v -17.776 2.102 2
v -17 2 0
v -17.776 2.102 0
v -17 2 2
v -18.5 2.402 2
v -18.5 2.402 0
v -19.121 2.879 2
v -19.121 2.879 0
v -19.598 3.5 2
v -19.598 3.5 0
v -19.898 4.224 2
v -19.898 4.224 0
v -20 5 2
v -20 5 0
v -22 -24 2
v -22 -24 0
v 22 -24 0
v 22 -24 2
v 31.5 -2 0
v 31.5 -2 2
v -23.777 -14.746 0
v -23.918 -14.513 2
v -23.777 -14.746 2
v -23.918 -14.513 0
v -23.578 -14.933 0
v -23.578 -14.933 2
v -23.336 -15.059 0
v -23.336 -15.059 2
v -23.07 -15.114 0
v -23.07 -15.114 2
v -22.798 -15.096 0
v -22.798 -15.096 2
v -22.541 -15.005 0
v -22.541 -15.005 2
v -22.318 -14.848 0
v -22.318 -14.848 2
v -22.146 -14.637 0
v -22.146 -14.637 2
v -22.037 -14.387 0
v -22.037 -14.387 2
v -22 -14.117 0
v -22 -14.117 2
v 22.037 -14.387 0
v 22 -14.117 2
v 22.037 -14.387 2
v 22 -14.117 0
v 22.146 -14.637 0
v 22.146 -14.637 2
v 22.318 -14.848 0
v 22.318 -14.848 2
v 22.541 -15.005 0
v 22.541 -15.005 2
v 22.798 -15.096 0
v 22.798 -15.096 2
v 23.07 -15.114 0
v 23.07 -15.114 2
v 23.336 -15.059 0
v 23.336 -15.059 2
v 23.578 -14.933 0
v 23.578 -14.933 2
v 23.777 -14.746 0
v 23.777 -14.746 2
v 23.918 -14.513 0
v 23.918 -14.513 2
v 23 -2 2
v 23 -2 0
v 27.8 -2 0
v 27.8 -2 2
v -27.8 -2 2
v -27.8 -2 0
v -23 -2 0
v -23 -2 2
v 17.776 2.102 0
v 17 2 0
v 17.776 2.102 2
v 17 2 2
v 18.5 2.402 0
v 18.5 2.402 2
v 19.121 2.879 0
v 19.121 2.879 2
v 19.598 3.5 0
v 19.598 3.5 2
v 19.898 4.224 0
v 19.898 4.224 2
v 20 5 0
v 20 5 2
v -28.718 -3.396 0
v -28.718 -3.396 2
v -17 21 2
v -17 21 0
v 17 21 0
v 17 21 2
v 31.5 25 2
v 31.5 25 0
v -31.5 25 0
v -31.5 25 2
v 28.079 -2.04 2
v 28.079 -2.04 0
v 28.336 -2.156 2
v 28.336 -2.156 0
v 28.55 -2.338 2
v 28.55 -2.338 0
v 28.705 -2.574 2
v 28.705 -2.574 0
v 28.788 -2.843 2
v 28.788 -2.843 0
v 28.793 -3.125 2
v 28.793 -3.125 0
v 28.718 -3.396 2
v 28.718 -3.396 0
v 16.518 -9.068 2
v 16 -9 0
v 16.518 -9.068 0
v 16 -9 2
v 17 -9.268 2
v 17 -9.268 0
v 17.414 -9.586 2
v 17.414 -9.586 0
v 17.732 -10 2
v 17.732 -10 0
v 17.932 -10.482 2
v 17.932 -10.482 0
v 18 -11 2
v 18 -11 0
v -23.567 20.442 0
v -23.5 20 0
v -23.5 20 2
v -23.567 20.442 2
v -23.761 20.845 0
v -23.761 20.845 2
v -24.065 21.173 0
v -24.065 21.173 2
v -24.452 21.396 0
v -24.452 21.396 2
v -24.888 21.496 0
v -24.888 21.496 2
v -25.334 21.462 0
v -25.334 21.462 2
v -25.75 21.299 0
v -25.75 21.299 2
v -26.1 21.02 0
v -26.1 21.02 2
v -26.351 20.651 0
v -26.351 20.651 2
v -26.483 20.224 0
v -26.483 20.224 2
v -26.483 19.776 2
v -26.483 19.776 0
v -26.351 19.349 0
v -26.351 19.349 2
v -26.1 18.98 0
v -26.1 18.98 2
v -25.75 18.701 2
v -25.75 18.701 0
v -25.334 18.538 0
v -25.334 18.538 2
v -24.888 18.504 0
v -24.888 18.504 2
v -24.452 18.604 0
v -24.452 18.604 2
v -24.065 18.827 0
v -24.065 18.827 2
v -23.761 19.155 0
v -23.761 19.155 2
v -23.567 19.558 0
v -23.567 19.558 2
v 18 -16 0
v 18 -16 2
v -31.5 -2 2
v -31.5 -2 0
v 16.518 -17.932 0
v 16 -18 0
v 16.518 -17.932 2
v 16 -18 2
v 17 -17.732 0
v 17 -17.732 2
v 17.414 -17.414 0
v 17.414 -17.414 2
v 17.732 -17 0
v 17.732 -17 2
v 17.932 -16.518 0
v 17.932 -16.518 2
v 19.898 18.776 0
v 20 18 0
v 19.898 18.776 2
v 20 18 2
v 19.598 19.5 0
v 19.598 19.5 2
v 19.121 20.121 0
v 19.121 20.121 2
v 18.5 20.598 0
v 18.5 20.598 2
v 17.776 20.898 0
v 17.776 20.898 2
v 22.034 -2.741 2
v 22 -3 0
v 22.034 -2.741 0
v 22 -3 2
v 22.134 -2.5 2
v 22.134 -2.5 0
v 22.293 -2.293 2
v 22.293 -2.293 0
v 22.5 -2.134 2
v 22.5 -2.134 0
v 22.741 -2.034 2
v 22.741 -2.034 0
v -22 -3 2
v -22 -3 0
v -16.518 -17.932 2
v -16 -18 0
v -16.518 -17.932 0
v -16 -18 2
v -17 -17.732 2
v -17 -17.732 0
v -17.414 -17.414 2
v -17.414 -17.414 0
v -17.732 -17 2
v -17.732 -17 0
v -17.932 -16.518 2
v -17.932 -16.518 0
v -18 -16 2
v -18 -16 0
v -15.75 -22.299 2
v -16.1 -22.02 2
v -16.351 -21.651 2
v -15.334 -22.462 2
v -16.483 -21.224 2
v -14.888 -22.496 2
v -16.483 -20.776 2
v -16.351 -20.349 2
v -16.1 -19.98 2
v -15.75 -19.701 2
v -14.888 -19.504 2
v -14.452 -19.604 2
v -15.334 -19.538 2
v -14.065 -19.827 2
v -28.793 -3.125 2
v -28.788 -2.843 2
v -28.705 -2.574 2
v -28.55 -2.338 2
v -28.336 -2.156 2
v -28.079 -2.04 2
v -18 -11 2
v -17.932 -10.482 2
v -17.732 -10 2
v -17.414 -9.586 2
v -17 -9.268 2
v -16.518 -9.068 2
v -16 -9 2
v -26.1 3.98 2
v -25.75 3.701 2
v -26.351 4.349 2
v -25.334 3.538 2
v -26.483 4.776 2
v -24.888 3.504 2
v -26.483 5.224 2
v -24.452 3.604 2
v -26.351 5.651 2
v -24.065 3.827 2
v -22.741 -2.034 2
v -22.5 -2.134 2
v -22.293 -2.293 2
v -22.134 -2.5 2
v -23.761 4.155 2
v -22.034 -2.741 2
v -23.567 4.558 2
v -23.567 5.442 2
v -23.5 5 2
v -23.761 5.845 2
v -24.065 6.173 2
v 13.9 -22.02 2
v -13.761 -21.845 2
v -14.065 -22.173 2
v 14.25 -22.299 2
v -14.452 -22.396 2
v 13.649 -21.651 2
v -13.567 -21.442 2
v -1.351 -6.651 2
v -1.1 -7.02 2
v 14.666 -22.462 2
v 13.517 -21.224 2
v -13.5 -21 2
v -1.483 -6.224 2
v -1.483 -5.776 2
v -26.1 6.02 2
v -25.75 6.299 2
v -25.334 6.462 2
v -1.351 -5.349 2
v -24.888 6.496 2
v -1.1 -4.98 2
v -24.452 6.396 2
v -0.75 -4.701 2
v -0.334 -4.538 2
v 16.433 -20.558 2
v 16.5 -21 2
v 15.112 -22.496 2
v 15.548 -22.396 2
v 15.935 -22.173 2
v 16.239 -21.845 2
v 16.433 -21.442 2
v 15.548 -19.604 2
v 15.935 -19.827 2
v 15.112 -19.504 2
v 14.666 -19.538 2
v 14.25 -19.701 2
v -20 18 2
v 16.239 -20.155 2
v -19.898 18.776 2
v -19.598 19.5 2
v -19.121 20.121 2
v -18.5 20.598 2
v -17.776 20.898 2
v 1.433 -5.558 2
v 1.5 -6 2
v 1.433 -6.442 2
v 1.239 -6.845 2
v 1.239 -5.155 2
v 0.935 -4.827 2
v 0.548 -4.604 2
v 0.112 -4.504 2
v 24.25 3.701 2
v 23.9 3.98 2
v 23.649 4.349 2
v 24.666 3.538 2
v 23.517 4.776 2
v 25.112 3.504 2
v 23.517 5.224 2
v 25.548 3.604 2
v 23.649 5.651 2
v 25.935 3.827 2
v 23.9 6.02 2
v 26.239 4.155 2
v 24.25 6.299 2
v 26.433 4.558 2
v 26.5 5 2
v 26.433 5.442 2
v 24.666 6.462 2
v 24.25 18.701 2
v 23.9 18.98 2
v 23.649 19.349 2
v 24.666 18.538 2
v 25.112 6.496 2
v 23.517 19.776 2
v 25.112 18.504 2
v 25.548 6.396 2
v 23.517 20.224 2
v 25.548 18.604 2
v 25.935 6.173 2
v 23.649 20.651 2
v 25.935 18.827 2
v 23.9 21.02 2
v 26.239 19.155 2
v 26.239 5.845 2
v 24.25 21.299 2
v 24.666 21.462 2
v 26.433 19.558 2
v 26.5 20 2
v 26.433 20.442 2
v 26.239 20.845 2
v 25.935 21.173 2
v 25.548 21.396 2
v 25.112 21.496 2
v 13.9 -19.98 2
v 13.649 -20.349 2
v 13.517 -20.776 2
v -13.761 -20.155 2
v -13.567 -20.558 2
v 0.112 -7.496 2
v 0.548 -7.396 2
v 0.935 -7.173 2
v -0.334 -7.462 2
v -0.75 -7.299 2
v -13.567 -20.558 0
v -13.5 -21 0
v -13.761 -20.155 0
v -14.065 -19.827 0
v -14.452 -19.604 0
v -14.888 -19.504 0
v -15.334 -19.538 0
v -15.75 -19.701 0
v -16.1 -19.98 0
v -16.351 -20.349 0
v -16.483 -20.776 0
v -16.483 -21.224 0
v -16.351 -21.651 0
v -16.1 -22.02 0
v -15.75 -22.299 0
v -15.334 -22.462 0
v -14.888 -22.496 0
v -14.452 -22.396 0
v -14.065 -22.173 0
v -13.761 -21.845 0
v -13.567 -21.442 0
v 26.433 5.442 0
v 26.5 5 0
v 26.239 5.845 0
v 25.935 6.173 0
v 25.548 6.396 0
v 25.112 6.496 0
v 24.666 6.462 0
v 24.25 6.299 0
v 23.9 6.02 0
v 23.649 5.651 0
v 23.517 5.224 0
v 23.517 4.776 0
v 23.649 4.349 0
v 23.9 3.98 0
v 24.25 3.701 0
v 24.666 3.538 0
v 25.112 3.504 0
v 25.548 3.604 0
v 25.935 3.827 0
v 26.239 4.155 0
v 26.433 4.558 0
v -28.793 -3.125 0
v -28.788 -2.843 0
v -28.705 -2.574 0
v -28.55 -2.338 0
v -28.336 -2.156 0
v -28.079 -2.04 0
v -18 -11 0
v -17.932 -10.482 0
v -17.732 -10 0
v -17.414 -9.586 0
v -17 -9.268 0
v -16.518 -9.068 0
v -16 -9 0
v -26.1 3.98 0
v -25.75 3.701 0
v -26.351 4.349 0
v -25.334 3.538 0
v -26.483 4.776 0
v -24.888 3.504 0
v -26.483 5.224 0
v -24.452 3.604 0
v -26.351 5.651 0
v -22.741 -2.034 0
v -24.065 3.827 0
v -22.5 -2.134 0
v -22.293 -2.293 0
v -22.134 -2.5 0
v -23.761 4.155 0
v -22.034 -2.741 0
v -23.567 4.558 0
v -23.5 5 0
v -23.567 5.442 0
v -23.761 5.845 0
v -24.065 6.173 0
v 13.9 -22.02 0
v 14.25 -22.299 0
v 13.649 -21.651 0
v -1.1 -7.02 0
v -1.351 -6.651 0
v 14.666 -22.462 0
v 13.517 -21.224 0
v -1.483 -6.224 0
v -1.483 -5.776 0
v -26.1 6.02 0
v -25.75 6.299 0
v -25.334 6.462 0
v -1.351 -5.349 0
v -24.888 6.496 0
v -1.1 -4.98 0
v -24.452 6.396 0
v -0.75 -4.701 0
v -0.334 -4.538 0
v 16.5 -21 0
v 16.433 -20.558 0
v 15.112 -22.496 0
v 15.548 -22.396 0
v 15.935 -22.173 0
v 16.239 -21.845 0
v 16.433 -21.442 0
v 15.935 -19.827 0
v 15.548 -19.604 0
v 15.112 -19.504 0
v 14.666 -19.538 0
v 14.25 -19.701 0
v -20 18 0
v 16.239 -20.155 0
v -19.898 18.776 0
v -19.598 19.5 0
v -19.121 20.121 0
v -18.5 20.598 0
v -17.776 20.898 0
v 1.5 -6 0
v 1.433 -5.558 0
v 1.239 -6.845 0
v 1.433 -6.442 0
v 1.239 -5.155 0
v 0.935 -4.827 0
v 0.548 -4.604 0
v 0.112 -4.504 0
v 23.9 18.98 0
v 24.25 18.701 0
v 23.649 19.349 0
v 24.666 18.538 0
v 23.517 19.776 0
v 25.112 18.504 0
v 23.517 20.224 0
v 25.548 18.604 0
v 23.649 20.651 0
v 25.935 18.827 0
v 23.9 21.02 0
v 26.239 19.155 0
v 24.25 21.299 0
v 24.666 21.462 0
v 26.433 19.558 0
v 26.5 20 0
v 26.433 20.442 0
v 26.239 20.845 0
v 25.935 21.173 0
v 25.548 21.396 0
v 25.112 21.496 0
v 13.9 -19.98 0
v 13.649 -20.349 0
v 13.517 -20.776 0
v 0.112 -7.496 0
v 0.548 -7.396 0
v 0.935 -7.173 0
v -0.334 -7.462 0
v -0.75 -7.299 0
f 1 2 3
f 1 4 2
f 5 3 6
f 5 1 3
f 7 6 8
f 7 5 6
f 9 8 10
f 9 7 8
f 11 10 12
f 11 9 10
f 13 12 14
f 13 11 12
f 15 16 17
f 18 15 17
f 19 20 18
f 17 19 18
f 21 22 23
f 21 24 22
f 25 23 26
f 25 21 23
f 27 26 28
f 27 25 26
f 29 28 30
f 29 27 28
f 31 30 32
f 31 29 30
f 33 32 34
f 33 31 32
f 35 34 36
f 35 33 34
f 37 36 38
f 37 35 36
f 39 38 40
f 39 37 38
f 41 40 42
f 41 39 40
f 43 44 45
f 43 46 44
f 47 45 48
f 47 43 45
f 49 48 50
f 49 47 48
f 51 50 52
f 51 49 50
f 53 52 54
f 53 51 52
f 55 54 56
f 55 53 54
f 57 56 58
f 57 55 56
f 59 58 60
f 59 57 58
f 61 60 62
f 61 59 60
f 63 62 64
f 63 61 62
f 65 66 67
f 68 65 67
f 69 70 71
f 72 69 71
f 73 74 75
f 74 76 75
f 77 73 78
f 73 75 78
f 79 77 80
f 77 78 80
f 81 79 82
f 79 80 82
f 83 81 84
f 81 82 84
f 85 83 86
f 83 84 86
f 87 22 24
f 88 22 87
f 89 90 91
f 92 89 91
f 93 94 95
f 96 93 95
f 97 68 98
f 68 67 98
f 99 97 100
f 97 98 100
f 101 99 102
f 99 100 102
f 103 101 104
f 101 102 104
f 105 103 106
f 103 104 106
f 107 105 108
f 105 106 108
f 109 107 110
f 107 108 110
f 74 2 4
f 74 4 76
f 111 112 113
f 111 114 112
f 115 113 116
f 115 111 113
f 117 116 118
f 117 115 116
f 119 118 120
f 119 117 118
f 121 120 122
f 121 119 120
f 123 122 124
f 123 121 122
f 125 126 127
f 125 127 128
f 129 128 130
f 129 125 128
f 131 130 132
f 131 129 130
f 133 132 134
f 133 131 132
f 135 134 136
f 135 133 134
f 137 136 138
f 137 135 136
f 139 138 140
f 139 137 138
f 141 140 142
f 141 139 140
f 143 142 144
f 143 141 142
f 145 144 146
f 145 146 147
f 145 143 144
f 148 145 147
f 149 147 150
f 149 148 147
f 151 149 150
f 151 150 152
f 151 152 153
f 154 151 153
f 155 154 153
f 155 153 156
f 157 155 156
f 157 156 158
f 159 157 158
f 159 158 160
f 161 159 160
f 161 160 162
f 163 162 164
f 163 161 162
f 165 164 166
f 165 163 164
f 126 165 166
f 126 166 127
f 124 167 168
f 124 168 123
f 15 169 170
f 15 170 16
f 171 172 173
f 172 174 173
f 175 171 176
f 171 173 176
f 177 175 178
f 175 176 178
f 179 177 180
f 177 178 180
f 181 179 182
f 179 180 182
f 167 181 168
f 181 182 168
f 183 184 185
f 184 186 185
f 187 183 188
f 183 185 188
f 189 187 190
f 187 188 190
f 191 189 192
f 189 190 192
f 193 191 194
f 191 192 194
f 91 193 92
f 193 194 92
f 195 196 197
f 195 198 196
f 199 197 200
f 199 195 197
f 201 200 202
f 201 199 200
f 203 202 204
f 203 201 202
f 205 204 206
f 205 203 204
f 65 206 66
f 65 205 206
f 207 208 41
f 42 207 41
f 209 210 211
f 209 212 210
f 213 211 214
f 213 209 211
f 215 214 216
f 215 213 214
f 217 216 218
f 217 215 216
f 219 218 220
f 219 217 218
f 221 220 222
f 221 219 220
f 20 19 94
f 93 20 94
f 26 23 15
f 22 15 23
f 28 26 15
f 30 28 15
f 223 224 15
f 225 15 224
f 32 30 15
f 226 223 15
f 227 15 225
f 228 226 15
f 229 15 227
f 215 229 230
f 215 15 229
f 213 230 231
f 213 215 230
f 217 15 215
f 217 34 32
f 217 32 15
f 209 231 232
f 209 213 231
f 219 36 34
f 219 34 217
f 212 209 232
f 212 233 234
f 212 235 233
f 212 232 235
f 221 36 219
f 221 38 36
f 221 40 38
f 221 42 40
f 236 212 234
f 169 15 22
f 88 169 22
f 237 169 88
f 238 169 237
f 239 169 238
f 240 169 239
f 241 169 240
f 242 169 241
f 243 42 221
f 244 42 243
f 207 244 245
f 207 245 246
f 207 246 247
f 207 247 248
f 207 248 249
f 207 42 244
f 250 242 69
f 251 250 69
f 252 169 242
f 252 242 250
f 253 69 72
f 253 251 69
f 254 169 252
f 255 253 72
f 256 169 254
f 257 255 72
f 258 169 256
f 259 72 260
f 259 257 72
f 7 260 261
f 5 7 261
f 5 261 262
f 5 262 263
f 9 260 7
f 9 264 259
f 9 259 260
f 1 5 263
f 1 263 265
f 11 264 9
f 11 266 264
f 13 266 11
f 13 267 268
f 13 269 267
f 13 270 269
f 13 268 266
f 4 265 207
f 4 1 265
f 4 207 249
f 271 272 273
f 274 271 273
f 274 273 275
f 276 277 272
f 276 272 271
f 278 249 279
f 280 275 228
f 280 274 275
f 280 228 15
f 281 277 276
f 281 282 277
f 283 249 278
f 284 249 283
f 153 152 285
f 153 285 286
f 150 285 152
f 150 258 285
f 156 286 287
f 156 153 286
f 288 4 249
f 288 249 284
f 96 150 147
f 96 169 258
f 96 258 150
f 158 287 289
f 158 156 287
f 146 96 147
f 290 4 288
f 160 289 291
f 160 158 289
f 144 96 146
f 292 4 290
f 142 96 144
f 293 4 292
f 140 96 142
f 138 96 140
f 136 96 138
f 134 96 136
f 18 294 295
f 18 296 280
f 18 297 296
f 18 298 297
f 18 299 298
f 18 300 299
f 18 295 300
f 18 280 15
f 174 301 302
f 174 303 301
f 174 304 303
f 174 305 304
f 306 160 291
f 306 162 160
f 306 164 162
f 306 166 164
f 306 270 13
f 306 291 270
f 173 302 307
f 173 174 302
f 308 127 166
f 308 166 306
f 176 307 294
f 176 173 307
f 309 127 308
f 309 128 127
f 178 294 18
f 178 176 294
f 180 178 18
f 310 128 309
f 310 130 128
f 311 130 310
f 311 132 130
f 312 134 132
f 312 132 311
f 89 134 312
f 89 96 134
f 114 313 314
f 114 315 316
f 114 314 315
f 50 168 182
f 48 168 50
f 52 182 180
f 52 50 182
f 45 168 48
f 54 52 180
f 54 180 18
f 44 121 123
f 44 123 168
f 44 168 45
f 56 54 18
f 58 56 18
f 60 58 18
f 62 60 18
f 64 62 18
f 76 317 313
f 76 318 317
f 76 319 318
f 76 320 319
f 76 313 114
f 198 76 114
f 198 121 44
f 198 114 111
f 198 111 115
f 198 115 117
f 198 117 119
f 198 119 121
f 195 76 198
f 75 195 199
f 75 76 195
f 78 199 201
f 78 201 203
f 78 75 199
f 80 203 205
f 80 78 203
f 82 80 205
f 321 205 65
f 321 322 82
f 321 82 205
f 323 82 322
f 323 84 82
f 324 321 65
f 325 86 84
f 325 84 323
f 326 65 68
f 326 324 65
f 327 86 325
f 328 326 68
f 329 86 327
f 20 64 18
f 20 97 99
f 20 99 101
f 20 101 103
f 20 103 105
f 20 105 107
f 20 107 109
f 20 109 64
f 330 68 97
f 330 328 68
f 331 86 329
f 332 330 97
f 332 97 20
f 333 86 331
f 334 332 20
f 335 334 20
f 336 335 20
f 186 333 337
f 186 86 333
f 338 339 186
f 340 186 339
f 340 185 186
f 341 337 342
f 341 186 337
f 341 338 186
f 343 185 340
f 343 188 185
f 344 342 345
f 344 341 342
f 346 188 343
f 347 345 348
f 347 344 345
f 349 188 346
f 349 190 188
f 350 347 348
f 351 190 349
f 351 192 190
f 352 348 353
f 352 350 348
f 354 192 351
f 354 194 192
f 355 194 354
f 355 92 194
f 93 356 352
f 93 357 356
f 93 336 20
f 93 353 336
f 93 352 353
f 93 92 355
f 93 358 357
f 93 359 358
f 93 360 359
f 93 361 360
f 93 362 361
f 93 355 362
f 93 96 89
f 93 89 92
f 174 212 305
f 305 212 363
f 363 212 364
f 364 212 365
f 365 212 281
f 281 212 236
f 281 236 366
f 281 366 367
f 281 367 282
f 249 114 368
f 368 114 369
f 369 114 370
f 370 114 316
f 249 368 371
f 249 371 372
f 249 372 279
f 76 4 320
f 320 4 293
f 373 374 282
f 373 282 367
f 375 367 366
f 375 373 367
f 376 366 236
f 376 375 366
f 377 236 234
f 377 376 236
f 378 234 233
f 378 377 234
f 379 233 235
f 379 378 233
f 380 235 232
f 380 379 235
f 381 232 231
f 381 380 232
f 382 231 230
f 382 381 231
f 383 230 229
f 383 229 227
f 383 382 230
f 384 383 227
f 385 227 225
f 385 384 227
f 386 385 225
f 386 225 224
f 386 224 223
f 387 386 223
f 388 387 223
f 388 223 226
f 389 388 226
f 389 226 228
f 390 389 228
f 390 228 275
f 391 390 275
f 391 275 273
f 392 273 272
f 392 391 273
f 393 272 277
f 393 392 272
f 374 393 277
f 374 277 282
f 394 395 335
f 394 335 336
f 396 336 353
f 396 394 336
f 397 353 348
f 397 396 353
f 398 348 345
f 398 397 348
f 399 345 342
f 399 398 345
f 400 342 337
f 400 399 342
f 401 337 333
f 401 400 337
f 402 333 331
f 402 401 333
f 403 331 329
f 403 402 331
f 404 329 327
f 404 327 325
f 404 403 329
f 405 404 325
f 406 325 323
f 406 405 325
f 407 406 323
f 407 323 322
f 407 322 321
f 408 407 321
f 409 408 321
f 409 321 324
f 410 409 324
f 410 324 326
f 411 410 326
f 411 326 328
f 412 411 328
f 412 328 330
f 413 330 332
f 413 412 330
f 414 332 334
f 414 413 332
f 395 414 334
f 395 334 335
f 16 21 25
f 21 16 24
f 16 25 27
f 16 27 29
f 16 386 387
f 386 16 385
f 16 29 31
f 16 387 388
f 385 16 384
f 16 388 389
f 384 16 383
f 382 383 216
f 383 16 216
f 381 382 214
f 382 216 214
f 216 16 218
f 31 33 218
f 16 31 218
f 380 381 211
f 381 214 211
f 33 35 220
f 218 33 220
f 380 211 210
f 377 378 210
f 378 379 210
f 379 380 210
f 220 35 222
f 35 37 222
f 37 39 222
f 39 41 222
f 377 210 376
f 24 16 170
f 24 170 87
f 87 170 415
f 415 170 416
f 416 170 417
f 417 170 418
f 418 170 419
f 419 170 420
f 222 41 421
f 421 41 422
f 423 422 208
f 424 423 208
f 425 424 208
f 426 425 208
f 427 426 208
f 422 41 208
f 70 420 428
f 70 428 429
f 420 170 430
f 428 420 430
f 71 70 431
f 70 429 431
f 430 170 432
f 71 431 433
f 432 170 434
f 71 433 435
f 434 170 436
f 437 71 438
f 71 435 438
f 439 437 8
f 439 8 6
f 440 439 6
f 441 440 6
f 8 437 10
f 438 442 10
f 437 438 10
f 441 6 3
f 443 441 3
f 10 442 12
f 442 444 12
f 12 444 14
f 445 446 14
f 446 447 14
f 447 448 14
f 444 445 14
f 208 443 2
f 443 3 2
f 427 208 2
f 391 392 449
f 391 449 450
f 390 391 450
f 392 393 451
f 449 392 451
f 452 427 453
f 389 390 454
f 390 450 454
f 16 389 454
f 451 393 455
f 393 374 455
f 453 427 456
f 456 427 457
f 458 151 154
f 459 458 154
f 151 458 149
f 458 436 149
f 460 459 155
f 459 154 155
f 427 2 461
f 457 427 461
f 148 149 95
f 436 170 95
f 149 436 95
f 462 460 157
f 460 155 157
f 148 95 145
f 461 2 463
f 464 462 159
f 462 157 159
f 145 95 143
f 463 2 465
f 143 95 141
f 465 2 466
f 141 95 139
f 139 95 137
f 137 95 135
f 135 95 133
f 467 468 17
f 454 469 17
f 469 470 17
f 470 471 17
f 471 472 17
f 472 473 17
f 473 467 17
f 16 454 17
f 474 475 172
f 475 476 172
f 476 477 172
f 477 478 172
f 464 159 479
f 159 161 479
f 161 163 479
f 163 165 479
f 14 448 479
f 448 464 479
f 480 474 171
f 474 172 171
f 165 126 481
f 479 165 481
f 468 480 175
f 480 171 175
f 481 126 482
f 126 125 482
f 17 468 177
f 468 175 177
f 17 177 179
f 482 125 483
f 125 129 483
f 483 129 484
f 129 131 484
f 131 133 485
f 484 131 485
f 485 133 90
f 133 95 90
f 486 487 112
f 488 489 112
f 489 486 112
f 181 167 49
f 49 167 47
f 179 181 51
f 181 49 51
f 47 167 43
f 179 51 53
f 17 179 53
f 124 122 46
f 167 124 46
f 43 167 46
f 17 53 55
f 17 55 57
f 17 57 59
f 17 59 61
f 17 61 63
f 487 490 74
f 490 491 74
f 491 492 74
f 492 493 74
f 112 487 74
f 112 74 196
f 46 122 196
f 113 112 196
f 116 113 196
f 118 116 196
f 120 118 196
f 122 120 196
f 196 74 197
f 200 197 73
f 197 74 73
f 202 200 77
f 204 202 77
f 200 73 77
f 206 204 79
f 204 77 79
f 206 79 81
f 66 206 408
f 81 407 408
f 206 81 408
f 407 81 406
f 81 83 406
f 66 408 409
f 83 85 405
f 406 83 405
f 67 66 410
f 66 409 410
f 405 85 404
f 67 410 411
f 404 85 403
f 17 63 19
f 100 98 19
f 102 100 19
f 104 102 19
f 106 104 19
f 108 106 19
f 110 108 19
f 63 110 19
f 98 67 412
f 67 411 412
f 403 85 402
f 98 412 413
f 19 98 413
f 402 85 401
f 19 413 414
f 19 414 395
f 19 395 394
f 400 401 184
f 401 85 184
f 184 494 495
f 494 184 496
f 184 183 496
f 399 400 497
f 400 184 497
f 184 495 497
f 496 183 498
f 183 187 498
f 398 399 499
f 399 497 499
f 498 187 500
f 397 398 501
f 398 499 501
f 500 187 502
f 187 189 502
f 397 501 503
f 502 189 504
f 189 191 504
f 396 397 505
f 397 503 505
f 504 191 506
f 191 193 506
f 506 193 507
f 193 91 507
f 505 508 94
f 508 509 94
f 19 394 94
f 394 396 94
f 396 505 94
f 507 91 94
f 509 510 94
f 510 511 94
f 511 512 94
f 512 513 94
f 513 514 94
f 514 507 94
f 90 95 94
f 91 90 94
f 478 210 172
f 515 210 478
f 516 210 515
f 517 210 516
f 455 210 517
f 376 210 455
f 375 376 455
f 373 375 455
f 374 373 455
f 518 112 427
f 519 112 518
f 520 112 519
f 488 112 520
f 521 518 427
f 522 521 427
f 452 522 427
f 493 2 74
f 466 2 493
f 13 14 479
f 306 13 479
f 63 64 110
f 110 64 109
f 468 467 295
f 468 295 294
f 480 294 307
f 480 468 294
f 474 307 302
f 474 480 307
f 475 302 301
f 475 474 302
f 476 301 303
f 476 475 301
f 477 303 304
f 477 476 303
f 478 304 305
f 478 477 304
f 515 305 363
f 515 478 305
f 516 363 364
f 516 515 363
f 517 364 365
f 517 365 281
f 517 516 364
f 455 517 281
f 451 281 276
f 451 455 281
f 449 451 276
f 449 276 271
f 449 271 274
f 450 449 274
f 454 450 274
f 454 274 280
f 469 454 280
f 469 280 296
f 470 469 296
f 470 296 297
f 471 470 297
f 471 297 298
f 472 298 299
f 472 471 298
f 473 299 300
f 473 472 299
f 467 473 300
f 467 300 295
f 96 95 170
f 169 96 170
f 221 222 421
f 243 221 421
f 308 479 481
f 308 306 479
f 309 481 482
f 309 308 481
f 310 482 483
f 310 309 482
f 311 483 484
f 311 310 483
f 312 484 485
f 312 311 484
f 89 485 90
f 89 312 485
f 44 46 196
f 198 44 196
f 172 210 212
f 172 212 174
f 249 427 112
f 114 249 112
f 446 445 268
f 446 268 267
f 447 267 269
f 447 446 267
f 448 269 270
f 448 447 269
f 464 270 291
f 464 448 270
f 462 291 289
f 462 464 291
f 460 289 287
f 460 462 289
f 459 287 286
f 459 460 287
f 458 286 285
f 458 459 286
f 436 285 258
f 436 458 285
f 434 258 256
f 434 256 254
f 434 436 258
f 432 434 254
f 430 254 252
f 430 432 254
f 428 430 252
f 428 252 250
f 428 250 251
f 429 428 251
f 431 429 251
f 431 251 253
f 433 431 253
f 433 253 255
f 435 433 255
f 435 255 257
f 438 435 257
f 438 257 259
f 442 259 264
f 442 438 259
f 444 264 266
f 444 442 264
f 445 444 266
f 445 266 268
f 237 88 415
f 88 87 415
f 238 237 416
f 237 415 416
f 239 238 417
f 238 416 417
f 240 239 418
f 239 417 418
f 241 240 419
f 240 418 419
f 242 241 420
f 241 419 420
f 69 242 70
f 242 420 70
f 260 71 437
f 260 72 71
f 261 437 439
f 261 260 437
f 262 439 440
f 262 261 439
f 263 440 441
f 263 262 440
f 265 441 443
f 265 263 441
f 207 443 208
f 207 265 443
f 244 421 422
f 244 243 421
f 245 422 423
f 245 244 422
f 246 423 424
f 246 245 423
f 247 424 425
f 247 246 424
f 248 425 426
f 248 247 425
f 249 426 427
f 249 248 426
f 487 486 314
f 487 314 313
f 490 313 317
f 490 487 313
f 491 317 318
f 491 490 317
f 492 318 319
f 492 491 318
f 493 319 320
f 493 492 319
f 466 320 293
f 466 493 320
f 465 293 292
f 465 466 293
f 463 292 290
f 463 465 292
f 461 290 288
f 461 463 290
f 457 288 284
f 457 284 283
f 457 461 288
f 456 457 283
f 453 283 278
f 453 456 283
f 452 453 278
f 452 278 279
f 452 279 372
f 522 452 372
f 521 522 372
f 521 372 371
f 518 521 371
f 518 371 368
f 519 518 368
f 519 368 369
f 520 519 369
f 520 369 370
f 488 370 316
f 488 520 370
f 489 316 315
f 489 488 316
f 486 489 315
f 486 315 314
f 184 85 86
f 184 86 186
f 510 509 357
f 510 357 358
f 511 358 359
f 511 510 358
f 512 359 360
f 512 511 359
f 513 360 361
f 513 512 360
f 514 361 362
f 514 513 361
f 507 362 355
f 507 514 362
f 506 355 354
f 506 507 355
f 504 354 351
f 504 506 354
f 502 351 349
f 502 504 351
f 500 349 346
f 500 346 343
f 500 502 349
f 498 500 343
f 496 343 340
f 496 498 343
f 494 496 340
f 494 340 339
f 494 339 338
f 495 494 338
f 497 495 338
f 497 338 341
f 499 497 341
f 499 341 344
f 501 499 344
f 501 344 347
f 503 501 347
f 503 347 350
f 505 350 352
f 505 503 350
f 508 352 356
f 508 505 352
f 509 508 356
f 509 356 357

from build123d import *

# Parameters (mm, degrees)
SKETCH_1_R      = 1.5
SKETCH_1_W      = 40
SKETCH_1_H      = 19
SKETCH_1_W_2    = 36
SKETCH_1_H_2    = 9
EXTRUDE_1_DEPTH = 2
EXTRUDE_2_DEPTH = 2
FILLET_1_R      = 3
FILLET_2_R      = 2
FILLET_3_R      = 1


with BuildPart() as part:
    # 草图1 → 凸台-拉伸1 (new body)
    with BuildSketch(Plane.XY):
        Polygon((-31.5, -2), (-22, -2), (-22, -24), (22, -24), (22, -2), (31.5, -2), (31.5, 25), (-31.5, 25), align=None)
        with Locations((-25, 20)):
            Circle(SKETCH_1_R, mode=Mode.SUBTRACT)
        with Locations((25, 20)):
            Circle(SKETCH_1_R, mode=Mode.SUBTRACT)
        with Locations((-25, 5)):
            Circle(SKETCH_1_R, mode=Mode.SUBTRACT)
        with Locations((25, 5)):
            Circle(SKETCH_1_R, mode=Mode.SUBTRACT)
        with Locations((0, -6)):
            Circle(SKETCH_1_R, mode=Mode.SUBTRACT)
        with Locations((-15, -21)):
            Circle(SKETCH_1_R, mode=Mode.SUBTRACT)
        with Locations((15, -21)):
            Circle(SKETCH_1_R, mode=Mode.SUBTRACT)
        with Locations((0, 11.5)):
            Rectangle(SKETCH_1_W, SKETCH_1_H, mode=Mode.SUBTRACT)
        with Locations((0, -13.5)):
            Rectangle(SKETCH_1_W_2, SKETCH_1_H_2, mode=Mode.SUBTRACT)
    extrude(amount=EXTRUDE_1_DEPTH)

    # 草图2 → 凸台-拉伸2 (add)
    with BuildSketch(Plane.XY.offset(2)):
        Polygon((-31.5, -2), (-22, -24), (-22, -18.955049698), (-29.321498733, -2), align=None)
        Polygon((31.5, -2), (22, -24), (22, -18.955049698), (29.321498733, -2), align=None)
    extrude(amount=-EXTRUDE_2_DEPTH)

    # 圆角1
    fillet_1_edges = [part.edges().sort_by_distance(p)[0] for p in [
        (20, 2, 1),
        (20, 21, 1),
        (-20, 21, 1),
        (-20, 2, 1),
    ]]
    fillet(fillet_1_edges, radius=FILLET_1_R)

    # 圆角2
    fillet_2_edges = [part.edges().sort_by_distance(p)[0] for p in [
        (18, -18, 1),
        (18, -9, 1),
        (-18, -9, 1),
        (-18, -18, 1),
    ]]
    fillet(fillet_2_edges, radius=FILLET_2_R)

    # 圆角3
    fillet_3_edges = [part.edges().sort_by_distance(p)[0] for p in [
        (22, -2, 1),
        (-22, -2, 1),
        (-22, -18.955049698, 1),
        (-29.321498733, -2, 1),
        (22, -18.955049698, 1),
        (29.321498733, -2, 1),
    ]]
    fillet(fillet_3_edges, radius=FILLET_3_R)


solid = part.part
